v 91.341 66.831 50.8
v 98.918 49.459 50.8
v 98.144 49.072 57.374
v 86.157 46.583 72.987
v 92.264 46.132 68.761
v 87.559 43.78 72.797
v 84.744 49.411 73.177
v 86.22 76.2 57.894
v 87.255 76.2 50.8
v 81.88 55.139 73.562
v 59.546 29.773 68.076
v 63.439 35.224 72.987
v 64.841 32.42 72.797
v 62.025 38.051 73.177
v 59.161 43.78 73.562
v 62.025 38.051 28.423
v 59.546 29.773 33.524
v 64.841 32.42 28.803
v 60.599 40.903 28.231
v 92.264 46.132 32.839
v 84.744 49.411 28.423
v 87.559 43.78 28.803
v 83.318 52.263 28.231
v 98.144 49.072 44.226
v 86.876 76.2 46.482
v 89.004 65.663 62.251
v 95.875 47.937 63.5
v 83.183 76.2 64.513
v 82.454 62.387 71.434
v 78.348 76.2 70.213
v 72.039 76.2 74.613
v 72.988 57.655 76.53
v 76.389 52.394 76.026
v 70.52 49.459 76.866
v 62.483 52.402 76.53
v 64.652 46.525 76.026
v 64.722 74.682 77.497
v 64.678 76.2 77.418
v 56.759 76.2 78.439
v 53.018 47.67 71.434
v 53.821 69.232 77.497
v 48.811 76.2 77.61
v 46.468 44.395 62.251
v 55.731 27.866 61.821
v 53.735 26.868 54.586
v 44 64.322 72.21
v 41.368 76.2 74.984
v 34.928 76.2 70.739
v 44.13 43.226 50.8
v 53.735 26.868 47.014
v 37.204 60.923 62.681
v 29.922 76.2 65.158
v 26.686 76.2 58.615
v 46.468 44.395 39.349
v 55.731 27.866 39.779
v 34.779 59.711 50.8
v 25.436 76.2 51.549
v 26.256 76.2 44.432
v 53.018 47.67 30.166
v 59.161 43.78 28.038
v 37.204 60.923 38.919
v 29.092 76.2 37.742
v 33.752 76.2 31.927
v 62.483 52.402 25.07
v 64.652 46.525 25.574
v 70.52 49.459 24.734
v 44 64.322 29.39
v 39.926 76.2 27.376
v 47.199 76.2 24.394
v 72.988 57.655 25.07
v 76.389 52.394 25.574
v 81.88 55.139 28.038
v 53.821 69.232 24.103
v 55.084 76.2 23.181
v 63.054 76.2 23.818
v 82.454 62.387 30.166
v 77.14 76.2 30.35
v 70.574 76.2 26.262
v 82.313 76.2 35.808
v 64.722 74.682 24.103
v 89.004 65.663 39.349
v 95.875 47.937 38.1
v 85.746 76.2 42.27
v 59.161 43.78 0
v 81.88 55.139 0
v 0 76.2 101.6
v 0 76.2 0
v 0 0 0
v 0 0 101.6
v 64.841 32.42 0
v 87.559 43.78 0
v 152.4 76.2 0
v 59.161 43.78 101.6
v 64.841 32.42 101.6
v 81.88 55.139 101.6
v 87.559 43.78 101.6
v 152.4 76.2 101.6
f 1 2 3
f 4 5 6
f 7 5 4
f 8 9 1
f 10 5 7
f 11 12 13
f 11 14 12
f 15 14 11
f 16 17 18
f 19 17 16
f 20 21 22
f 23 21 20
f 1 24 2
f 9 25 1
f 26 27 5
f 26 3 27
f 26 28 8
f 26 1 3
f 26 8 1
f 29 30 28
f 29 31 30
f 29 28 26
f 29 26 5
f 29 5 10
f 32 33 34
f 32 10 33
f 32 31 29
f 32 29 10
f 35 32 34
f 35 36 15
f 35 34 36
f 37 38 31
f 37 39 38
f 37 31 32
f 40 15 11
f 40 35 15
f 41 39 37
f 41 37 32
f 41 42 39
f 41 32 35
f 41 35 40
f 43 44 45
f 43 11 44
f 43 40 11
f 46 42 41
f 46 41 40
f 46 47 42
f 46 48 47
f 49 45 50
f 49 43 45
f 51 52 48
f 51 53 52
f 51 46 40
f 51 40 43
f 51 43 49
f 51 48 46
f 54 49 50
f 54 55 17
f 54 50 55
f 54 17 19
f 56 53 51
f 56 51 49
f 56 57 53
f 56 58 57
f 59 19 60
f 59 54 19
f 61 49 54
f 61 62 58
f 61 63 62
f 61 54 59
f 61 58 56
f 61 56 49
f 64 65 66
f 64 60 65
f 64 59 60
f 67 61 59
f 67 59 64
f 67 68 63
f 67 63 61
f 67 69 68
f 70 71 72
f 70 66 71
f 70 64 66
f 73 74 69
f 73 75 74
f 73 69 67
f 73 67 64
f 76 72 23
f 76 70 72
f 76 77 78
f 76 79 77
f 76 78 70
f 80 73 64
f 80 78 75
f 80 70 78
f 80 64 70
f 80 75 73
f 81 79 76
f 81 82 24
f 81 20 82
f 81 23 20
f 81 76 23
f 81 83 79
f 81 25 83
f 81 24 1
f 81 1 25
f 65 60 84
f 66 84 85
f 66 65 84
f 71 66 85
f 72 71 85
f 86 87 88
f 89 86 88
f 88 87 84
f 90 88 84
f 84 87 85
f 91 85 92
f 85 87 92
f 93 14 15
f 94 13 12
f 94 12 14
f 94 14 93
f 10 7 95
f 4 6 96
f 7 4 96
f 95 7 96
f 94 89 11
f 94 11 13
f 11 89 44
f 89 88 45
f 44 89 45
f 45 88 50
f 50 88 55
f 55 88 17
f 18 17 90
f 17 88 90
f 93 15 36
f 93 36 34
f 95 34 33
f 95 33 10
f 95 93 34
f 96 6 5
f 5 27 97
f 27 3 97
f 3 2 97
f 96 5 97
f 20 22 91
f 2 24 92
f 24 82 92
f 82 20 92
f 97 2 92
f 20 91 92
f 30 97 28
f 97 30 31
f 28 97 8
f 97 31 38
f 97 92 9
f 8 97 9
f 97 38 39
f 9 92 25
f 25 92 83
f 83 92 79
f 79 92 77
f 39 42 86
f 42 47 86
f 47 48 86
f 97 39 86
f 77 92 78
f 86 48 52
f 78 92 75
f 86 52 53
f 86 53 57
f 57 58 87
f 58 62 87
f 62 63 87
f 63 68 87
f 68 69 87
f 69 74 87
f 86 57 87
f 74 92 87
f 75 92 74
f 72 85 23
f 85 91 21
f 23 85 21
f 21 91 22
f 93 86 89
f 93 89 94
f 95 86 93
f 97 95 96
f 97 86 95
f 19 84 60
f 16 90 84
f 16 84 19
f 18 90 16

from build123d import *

# Parameters (mm, degrees)
F1_DEPTH = 101.6
F2_W     = 25.4
F2_H     = 101.6
F3_DEPTH = 12.7
F5_DEPTH = 141.478
F5_TAPER = -3


with BuildPart() as f1:
    # F0 (on Top) → F1 (new body)
    with BuildSketch(Plane.XY):
        Polygon((0, 76.2), (0, 0), (152.4, 76.2), align=None)
    extrude(amount=F1_DEPTH)

    # F2 (on face) → F3 (cut)
    with BuildSketch(Plane(origin=(0, 0, 0), x_dir=(0.894427191, 0.4472135955, 0), z_dir=(0.4472135955, -0.894427191, 0))):
        with Locations((85.1941899427, 50.8)):
            Rectangle(F2_W, F2_H)
    extrude(amount=-F3_DEPTH, mode=Mode.SUBTRACT)

    # F4 (on face) → F5 (cut)
    with BuildSketch(Plane(origin=(0, 0, 0), x_dir=(0.894427191, 0.4472135955, 0), z_dir=(0.4472135955, -0.894427191, 0))):
        with BuildLine():
            ThreePointArc((72.4941899427, 28.8029547439), (97.8941899427, 28.8029547439), (110.5941899427, 50.8))
            ThreePointArc((110.5941899427, 50.8), (97.8941899427, 72.7970452561), (72.4941899427, 72.7970452561))
            Line((72.4941899427, 72.7970452561), (72.4941899427, 28.8029547439))
        make_face()
        with BuildLine():
            Line((72.4941899427, 28.8029547439), (72.4941899427, 72.7970452561))
            ThreePointArc((72.4941899427, 72.7970452561), (59.7941899427, 50.8), (72.4941899427, 28.8029547439))
        make_face()
    extrude(amount=-F5_DEPTH, taper=F5_TAPER, mode=Mode.SUBTRACT)


solid = f1.part
